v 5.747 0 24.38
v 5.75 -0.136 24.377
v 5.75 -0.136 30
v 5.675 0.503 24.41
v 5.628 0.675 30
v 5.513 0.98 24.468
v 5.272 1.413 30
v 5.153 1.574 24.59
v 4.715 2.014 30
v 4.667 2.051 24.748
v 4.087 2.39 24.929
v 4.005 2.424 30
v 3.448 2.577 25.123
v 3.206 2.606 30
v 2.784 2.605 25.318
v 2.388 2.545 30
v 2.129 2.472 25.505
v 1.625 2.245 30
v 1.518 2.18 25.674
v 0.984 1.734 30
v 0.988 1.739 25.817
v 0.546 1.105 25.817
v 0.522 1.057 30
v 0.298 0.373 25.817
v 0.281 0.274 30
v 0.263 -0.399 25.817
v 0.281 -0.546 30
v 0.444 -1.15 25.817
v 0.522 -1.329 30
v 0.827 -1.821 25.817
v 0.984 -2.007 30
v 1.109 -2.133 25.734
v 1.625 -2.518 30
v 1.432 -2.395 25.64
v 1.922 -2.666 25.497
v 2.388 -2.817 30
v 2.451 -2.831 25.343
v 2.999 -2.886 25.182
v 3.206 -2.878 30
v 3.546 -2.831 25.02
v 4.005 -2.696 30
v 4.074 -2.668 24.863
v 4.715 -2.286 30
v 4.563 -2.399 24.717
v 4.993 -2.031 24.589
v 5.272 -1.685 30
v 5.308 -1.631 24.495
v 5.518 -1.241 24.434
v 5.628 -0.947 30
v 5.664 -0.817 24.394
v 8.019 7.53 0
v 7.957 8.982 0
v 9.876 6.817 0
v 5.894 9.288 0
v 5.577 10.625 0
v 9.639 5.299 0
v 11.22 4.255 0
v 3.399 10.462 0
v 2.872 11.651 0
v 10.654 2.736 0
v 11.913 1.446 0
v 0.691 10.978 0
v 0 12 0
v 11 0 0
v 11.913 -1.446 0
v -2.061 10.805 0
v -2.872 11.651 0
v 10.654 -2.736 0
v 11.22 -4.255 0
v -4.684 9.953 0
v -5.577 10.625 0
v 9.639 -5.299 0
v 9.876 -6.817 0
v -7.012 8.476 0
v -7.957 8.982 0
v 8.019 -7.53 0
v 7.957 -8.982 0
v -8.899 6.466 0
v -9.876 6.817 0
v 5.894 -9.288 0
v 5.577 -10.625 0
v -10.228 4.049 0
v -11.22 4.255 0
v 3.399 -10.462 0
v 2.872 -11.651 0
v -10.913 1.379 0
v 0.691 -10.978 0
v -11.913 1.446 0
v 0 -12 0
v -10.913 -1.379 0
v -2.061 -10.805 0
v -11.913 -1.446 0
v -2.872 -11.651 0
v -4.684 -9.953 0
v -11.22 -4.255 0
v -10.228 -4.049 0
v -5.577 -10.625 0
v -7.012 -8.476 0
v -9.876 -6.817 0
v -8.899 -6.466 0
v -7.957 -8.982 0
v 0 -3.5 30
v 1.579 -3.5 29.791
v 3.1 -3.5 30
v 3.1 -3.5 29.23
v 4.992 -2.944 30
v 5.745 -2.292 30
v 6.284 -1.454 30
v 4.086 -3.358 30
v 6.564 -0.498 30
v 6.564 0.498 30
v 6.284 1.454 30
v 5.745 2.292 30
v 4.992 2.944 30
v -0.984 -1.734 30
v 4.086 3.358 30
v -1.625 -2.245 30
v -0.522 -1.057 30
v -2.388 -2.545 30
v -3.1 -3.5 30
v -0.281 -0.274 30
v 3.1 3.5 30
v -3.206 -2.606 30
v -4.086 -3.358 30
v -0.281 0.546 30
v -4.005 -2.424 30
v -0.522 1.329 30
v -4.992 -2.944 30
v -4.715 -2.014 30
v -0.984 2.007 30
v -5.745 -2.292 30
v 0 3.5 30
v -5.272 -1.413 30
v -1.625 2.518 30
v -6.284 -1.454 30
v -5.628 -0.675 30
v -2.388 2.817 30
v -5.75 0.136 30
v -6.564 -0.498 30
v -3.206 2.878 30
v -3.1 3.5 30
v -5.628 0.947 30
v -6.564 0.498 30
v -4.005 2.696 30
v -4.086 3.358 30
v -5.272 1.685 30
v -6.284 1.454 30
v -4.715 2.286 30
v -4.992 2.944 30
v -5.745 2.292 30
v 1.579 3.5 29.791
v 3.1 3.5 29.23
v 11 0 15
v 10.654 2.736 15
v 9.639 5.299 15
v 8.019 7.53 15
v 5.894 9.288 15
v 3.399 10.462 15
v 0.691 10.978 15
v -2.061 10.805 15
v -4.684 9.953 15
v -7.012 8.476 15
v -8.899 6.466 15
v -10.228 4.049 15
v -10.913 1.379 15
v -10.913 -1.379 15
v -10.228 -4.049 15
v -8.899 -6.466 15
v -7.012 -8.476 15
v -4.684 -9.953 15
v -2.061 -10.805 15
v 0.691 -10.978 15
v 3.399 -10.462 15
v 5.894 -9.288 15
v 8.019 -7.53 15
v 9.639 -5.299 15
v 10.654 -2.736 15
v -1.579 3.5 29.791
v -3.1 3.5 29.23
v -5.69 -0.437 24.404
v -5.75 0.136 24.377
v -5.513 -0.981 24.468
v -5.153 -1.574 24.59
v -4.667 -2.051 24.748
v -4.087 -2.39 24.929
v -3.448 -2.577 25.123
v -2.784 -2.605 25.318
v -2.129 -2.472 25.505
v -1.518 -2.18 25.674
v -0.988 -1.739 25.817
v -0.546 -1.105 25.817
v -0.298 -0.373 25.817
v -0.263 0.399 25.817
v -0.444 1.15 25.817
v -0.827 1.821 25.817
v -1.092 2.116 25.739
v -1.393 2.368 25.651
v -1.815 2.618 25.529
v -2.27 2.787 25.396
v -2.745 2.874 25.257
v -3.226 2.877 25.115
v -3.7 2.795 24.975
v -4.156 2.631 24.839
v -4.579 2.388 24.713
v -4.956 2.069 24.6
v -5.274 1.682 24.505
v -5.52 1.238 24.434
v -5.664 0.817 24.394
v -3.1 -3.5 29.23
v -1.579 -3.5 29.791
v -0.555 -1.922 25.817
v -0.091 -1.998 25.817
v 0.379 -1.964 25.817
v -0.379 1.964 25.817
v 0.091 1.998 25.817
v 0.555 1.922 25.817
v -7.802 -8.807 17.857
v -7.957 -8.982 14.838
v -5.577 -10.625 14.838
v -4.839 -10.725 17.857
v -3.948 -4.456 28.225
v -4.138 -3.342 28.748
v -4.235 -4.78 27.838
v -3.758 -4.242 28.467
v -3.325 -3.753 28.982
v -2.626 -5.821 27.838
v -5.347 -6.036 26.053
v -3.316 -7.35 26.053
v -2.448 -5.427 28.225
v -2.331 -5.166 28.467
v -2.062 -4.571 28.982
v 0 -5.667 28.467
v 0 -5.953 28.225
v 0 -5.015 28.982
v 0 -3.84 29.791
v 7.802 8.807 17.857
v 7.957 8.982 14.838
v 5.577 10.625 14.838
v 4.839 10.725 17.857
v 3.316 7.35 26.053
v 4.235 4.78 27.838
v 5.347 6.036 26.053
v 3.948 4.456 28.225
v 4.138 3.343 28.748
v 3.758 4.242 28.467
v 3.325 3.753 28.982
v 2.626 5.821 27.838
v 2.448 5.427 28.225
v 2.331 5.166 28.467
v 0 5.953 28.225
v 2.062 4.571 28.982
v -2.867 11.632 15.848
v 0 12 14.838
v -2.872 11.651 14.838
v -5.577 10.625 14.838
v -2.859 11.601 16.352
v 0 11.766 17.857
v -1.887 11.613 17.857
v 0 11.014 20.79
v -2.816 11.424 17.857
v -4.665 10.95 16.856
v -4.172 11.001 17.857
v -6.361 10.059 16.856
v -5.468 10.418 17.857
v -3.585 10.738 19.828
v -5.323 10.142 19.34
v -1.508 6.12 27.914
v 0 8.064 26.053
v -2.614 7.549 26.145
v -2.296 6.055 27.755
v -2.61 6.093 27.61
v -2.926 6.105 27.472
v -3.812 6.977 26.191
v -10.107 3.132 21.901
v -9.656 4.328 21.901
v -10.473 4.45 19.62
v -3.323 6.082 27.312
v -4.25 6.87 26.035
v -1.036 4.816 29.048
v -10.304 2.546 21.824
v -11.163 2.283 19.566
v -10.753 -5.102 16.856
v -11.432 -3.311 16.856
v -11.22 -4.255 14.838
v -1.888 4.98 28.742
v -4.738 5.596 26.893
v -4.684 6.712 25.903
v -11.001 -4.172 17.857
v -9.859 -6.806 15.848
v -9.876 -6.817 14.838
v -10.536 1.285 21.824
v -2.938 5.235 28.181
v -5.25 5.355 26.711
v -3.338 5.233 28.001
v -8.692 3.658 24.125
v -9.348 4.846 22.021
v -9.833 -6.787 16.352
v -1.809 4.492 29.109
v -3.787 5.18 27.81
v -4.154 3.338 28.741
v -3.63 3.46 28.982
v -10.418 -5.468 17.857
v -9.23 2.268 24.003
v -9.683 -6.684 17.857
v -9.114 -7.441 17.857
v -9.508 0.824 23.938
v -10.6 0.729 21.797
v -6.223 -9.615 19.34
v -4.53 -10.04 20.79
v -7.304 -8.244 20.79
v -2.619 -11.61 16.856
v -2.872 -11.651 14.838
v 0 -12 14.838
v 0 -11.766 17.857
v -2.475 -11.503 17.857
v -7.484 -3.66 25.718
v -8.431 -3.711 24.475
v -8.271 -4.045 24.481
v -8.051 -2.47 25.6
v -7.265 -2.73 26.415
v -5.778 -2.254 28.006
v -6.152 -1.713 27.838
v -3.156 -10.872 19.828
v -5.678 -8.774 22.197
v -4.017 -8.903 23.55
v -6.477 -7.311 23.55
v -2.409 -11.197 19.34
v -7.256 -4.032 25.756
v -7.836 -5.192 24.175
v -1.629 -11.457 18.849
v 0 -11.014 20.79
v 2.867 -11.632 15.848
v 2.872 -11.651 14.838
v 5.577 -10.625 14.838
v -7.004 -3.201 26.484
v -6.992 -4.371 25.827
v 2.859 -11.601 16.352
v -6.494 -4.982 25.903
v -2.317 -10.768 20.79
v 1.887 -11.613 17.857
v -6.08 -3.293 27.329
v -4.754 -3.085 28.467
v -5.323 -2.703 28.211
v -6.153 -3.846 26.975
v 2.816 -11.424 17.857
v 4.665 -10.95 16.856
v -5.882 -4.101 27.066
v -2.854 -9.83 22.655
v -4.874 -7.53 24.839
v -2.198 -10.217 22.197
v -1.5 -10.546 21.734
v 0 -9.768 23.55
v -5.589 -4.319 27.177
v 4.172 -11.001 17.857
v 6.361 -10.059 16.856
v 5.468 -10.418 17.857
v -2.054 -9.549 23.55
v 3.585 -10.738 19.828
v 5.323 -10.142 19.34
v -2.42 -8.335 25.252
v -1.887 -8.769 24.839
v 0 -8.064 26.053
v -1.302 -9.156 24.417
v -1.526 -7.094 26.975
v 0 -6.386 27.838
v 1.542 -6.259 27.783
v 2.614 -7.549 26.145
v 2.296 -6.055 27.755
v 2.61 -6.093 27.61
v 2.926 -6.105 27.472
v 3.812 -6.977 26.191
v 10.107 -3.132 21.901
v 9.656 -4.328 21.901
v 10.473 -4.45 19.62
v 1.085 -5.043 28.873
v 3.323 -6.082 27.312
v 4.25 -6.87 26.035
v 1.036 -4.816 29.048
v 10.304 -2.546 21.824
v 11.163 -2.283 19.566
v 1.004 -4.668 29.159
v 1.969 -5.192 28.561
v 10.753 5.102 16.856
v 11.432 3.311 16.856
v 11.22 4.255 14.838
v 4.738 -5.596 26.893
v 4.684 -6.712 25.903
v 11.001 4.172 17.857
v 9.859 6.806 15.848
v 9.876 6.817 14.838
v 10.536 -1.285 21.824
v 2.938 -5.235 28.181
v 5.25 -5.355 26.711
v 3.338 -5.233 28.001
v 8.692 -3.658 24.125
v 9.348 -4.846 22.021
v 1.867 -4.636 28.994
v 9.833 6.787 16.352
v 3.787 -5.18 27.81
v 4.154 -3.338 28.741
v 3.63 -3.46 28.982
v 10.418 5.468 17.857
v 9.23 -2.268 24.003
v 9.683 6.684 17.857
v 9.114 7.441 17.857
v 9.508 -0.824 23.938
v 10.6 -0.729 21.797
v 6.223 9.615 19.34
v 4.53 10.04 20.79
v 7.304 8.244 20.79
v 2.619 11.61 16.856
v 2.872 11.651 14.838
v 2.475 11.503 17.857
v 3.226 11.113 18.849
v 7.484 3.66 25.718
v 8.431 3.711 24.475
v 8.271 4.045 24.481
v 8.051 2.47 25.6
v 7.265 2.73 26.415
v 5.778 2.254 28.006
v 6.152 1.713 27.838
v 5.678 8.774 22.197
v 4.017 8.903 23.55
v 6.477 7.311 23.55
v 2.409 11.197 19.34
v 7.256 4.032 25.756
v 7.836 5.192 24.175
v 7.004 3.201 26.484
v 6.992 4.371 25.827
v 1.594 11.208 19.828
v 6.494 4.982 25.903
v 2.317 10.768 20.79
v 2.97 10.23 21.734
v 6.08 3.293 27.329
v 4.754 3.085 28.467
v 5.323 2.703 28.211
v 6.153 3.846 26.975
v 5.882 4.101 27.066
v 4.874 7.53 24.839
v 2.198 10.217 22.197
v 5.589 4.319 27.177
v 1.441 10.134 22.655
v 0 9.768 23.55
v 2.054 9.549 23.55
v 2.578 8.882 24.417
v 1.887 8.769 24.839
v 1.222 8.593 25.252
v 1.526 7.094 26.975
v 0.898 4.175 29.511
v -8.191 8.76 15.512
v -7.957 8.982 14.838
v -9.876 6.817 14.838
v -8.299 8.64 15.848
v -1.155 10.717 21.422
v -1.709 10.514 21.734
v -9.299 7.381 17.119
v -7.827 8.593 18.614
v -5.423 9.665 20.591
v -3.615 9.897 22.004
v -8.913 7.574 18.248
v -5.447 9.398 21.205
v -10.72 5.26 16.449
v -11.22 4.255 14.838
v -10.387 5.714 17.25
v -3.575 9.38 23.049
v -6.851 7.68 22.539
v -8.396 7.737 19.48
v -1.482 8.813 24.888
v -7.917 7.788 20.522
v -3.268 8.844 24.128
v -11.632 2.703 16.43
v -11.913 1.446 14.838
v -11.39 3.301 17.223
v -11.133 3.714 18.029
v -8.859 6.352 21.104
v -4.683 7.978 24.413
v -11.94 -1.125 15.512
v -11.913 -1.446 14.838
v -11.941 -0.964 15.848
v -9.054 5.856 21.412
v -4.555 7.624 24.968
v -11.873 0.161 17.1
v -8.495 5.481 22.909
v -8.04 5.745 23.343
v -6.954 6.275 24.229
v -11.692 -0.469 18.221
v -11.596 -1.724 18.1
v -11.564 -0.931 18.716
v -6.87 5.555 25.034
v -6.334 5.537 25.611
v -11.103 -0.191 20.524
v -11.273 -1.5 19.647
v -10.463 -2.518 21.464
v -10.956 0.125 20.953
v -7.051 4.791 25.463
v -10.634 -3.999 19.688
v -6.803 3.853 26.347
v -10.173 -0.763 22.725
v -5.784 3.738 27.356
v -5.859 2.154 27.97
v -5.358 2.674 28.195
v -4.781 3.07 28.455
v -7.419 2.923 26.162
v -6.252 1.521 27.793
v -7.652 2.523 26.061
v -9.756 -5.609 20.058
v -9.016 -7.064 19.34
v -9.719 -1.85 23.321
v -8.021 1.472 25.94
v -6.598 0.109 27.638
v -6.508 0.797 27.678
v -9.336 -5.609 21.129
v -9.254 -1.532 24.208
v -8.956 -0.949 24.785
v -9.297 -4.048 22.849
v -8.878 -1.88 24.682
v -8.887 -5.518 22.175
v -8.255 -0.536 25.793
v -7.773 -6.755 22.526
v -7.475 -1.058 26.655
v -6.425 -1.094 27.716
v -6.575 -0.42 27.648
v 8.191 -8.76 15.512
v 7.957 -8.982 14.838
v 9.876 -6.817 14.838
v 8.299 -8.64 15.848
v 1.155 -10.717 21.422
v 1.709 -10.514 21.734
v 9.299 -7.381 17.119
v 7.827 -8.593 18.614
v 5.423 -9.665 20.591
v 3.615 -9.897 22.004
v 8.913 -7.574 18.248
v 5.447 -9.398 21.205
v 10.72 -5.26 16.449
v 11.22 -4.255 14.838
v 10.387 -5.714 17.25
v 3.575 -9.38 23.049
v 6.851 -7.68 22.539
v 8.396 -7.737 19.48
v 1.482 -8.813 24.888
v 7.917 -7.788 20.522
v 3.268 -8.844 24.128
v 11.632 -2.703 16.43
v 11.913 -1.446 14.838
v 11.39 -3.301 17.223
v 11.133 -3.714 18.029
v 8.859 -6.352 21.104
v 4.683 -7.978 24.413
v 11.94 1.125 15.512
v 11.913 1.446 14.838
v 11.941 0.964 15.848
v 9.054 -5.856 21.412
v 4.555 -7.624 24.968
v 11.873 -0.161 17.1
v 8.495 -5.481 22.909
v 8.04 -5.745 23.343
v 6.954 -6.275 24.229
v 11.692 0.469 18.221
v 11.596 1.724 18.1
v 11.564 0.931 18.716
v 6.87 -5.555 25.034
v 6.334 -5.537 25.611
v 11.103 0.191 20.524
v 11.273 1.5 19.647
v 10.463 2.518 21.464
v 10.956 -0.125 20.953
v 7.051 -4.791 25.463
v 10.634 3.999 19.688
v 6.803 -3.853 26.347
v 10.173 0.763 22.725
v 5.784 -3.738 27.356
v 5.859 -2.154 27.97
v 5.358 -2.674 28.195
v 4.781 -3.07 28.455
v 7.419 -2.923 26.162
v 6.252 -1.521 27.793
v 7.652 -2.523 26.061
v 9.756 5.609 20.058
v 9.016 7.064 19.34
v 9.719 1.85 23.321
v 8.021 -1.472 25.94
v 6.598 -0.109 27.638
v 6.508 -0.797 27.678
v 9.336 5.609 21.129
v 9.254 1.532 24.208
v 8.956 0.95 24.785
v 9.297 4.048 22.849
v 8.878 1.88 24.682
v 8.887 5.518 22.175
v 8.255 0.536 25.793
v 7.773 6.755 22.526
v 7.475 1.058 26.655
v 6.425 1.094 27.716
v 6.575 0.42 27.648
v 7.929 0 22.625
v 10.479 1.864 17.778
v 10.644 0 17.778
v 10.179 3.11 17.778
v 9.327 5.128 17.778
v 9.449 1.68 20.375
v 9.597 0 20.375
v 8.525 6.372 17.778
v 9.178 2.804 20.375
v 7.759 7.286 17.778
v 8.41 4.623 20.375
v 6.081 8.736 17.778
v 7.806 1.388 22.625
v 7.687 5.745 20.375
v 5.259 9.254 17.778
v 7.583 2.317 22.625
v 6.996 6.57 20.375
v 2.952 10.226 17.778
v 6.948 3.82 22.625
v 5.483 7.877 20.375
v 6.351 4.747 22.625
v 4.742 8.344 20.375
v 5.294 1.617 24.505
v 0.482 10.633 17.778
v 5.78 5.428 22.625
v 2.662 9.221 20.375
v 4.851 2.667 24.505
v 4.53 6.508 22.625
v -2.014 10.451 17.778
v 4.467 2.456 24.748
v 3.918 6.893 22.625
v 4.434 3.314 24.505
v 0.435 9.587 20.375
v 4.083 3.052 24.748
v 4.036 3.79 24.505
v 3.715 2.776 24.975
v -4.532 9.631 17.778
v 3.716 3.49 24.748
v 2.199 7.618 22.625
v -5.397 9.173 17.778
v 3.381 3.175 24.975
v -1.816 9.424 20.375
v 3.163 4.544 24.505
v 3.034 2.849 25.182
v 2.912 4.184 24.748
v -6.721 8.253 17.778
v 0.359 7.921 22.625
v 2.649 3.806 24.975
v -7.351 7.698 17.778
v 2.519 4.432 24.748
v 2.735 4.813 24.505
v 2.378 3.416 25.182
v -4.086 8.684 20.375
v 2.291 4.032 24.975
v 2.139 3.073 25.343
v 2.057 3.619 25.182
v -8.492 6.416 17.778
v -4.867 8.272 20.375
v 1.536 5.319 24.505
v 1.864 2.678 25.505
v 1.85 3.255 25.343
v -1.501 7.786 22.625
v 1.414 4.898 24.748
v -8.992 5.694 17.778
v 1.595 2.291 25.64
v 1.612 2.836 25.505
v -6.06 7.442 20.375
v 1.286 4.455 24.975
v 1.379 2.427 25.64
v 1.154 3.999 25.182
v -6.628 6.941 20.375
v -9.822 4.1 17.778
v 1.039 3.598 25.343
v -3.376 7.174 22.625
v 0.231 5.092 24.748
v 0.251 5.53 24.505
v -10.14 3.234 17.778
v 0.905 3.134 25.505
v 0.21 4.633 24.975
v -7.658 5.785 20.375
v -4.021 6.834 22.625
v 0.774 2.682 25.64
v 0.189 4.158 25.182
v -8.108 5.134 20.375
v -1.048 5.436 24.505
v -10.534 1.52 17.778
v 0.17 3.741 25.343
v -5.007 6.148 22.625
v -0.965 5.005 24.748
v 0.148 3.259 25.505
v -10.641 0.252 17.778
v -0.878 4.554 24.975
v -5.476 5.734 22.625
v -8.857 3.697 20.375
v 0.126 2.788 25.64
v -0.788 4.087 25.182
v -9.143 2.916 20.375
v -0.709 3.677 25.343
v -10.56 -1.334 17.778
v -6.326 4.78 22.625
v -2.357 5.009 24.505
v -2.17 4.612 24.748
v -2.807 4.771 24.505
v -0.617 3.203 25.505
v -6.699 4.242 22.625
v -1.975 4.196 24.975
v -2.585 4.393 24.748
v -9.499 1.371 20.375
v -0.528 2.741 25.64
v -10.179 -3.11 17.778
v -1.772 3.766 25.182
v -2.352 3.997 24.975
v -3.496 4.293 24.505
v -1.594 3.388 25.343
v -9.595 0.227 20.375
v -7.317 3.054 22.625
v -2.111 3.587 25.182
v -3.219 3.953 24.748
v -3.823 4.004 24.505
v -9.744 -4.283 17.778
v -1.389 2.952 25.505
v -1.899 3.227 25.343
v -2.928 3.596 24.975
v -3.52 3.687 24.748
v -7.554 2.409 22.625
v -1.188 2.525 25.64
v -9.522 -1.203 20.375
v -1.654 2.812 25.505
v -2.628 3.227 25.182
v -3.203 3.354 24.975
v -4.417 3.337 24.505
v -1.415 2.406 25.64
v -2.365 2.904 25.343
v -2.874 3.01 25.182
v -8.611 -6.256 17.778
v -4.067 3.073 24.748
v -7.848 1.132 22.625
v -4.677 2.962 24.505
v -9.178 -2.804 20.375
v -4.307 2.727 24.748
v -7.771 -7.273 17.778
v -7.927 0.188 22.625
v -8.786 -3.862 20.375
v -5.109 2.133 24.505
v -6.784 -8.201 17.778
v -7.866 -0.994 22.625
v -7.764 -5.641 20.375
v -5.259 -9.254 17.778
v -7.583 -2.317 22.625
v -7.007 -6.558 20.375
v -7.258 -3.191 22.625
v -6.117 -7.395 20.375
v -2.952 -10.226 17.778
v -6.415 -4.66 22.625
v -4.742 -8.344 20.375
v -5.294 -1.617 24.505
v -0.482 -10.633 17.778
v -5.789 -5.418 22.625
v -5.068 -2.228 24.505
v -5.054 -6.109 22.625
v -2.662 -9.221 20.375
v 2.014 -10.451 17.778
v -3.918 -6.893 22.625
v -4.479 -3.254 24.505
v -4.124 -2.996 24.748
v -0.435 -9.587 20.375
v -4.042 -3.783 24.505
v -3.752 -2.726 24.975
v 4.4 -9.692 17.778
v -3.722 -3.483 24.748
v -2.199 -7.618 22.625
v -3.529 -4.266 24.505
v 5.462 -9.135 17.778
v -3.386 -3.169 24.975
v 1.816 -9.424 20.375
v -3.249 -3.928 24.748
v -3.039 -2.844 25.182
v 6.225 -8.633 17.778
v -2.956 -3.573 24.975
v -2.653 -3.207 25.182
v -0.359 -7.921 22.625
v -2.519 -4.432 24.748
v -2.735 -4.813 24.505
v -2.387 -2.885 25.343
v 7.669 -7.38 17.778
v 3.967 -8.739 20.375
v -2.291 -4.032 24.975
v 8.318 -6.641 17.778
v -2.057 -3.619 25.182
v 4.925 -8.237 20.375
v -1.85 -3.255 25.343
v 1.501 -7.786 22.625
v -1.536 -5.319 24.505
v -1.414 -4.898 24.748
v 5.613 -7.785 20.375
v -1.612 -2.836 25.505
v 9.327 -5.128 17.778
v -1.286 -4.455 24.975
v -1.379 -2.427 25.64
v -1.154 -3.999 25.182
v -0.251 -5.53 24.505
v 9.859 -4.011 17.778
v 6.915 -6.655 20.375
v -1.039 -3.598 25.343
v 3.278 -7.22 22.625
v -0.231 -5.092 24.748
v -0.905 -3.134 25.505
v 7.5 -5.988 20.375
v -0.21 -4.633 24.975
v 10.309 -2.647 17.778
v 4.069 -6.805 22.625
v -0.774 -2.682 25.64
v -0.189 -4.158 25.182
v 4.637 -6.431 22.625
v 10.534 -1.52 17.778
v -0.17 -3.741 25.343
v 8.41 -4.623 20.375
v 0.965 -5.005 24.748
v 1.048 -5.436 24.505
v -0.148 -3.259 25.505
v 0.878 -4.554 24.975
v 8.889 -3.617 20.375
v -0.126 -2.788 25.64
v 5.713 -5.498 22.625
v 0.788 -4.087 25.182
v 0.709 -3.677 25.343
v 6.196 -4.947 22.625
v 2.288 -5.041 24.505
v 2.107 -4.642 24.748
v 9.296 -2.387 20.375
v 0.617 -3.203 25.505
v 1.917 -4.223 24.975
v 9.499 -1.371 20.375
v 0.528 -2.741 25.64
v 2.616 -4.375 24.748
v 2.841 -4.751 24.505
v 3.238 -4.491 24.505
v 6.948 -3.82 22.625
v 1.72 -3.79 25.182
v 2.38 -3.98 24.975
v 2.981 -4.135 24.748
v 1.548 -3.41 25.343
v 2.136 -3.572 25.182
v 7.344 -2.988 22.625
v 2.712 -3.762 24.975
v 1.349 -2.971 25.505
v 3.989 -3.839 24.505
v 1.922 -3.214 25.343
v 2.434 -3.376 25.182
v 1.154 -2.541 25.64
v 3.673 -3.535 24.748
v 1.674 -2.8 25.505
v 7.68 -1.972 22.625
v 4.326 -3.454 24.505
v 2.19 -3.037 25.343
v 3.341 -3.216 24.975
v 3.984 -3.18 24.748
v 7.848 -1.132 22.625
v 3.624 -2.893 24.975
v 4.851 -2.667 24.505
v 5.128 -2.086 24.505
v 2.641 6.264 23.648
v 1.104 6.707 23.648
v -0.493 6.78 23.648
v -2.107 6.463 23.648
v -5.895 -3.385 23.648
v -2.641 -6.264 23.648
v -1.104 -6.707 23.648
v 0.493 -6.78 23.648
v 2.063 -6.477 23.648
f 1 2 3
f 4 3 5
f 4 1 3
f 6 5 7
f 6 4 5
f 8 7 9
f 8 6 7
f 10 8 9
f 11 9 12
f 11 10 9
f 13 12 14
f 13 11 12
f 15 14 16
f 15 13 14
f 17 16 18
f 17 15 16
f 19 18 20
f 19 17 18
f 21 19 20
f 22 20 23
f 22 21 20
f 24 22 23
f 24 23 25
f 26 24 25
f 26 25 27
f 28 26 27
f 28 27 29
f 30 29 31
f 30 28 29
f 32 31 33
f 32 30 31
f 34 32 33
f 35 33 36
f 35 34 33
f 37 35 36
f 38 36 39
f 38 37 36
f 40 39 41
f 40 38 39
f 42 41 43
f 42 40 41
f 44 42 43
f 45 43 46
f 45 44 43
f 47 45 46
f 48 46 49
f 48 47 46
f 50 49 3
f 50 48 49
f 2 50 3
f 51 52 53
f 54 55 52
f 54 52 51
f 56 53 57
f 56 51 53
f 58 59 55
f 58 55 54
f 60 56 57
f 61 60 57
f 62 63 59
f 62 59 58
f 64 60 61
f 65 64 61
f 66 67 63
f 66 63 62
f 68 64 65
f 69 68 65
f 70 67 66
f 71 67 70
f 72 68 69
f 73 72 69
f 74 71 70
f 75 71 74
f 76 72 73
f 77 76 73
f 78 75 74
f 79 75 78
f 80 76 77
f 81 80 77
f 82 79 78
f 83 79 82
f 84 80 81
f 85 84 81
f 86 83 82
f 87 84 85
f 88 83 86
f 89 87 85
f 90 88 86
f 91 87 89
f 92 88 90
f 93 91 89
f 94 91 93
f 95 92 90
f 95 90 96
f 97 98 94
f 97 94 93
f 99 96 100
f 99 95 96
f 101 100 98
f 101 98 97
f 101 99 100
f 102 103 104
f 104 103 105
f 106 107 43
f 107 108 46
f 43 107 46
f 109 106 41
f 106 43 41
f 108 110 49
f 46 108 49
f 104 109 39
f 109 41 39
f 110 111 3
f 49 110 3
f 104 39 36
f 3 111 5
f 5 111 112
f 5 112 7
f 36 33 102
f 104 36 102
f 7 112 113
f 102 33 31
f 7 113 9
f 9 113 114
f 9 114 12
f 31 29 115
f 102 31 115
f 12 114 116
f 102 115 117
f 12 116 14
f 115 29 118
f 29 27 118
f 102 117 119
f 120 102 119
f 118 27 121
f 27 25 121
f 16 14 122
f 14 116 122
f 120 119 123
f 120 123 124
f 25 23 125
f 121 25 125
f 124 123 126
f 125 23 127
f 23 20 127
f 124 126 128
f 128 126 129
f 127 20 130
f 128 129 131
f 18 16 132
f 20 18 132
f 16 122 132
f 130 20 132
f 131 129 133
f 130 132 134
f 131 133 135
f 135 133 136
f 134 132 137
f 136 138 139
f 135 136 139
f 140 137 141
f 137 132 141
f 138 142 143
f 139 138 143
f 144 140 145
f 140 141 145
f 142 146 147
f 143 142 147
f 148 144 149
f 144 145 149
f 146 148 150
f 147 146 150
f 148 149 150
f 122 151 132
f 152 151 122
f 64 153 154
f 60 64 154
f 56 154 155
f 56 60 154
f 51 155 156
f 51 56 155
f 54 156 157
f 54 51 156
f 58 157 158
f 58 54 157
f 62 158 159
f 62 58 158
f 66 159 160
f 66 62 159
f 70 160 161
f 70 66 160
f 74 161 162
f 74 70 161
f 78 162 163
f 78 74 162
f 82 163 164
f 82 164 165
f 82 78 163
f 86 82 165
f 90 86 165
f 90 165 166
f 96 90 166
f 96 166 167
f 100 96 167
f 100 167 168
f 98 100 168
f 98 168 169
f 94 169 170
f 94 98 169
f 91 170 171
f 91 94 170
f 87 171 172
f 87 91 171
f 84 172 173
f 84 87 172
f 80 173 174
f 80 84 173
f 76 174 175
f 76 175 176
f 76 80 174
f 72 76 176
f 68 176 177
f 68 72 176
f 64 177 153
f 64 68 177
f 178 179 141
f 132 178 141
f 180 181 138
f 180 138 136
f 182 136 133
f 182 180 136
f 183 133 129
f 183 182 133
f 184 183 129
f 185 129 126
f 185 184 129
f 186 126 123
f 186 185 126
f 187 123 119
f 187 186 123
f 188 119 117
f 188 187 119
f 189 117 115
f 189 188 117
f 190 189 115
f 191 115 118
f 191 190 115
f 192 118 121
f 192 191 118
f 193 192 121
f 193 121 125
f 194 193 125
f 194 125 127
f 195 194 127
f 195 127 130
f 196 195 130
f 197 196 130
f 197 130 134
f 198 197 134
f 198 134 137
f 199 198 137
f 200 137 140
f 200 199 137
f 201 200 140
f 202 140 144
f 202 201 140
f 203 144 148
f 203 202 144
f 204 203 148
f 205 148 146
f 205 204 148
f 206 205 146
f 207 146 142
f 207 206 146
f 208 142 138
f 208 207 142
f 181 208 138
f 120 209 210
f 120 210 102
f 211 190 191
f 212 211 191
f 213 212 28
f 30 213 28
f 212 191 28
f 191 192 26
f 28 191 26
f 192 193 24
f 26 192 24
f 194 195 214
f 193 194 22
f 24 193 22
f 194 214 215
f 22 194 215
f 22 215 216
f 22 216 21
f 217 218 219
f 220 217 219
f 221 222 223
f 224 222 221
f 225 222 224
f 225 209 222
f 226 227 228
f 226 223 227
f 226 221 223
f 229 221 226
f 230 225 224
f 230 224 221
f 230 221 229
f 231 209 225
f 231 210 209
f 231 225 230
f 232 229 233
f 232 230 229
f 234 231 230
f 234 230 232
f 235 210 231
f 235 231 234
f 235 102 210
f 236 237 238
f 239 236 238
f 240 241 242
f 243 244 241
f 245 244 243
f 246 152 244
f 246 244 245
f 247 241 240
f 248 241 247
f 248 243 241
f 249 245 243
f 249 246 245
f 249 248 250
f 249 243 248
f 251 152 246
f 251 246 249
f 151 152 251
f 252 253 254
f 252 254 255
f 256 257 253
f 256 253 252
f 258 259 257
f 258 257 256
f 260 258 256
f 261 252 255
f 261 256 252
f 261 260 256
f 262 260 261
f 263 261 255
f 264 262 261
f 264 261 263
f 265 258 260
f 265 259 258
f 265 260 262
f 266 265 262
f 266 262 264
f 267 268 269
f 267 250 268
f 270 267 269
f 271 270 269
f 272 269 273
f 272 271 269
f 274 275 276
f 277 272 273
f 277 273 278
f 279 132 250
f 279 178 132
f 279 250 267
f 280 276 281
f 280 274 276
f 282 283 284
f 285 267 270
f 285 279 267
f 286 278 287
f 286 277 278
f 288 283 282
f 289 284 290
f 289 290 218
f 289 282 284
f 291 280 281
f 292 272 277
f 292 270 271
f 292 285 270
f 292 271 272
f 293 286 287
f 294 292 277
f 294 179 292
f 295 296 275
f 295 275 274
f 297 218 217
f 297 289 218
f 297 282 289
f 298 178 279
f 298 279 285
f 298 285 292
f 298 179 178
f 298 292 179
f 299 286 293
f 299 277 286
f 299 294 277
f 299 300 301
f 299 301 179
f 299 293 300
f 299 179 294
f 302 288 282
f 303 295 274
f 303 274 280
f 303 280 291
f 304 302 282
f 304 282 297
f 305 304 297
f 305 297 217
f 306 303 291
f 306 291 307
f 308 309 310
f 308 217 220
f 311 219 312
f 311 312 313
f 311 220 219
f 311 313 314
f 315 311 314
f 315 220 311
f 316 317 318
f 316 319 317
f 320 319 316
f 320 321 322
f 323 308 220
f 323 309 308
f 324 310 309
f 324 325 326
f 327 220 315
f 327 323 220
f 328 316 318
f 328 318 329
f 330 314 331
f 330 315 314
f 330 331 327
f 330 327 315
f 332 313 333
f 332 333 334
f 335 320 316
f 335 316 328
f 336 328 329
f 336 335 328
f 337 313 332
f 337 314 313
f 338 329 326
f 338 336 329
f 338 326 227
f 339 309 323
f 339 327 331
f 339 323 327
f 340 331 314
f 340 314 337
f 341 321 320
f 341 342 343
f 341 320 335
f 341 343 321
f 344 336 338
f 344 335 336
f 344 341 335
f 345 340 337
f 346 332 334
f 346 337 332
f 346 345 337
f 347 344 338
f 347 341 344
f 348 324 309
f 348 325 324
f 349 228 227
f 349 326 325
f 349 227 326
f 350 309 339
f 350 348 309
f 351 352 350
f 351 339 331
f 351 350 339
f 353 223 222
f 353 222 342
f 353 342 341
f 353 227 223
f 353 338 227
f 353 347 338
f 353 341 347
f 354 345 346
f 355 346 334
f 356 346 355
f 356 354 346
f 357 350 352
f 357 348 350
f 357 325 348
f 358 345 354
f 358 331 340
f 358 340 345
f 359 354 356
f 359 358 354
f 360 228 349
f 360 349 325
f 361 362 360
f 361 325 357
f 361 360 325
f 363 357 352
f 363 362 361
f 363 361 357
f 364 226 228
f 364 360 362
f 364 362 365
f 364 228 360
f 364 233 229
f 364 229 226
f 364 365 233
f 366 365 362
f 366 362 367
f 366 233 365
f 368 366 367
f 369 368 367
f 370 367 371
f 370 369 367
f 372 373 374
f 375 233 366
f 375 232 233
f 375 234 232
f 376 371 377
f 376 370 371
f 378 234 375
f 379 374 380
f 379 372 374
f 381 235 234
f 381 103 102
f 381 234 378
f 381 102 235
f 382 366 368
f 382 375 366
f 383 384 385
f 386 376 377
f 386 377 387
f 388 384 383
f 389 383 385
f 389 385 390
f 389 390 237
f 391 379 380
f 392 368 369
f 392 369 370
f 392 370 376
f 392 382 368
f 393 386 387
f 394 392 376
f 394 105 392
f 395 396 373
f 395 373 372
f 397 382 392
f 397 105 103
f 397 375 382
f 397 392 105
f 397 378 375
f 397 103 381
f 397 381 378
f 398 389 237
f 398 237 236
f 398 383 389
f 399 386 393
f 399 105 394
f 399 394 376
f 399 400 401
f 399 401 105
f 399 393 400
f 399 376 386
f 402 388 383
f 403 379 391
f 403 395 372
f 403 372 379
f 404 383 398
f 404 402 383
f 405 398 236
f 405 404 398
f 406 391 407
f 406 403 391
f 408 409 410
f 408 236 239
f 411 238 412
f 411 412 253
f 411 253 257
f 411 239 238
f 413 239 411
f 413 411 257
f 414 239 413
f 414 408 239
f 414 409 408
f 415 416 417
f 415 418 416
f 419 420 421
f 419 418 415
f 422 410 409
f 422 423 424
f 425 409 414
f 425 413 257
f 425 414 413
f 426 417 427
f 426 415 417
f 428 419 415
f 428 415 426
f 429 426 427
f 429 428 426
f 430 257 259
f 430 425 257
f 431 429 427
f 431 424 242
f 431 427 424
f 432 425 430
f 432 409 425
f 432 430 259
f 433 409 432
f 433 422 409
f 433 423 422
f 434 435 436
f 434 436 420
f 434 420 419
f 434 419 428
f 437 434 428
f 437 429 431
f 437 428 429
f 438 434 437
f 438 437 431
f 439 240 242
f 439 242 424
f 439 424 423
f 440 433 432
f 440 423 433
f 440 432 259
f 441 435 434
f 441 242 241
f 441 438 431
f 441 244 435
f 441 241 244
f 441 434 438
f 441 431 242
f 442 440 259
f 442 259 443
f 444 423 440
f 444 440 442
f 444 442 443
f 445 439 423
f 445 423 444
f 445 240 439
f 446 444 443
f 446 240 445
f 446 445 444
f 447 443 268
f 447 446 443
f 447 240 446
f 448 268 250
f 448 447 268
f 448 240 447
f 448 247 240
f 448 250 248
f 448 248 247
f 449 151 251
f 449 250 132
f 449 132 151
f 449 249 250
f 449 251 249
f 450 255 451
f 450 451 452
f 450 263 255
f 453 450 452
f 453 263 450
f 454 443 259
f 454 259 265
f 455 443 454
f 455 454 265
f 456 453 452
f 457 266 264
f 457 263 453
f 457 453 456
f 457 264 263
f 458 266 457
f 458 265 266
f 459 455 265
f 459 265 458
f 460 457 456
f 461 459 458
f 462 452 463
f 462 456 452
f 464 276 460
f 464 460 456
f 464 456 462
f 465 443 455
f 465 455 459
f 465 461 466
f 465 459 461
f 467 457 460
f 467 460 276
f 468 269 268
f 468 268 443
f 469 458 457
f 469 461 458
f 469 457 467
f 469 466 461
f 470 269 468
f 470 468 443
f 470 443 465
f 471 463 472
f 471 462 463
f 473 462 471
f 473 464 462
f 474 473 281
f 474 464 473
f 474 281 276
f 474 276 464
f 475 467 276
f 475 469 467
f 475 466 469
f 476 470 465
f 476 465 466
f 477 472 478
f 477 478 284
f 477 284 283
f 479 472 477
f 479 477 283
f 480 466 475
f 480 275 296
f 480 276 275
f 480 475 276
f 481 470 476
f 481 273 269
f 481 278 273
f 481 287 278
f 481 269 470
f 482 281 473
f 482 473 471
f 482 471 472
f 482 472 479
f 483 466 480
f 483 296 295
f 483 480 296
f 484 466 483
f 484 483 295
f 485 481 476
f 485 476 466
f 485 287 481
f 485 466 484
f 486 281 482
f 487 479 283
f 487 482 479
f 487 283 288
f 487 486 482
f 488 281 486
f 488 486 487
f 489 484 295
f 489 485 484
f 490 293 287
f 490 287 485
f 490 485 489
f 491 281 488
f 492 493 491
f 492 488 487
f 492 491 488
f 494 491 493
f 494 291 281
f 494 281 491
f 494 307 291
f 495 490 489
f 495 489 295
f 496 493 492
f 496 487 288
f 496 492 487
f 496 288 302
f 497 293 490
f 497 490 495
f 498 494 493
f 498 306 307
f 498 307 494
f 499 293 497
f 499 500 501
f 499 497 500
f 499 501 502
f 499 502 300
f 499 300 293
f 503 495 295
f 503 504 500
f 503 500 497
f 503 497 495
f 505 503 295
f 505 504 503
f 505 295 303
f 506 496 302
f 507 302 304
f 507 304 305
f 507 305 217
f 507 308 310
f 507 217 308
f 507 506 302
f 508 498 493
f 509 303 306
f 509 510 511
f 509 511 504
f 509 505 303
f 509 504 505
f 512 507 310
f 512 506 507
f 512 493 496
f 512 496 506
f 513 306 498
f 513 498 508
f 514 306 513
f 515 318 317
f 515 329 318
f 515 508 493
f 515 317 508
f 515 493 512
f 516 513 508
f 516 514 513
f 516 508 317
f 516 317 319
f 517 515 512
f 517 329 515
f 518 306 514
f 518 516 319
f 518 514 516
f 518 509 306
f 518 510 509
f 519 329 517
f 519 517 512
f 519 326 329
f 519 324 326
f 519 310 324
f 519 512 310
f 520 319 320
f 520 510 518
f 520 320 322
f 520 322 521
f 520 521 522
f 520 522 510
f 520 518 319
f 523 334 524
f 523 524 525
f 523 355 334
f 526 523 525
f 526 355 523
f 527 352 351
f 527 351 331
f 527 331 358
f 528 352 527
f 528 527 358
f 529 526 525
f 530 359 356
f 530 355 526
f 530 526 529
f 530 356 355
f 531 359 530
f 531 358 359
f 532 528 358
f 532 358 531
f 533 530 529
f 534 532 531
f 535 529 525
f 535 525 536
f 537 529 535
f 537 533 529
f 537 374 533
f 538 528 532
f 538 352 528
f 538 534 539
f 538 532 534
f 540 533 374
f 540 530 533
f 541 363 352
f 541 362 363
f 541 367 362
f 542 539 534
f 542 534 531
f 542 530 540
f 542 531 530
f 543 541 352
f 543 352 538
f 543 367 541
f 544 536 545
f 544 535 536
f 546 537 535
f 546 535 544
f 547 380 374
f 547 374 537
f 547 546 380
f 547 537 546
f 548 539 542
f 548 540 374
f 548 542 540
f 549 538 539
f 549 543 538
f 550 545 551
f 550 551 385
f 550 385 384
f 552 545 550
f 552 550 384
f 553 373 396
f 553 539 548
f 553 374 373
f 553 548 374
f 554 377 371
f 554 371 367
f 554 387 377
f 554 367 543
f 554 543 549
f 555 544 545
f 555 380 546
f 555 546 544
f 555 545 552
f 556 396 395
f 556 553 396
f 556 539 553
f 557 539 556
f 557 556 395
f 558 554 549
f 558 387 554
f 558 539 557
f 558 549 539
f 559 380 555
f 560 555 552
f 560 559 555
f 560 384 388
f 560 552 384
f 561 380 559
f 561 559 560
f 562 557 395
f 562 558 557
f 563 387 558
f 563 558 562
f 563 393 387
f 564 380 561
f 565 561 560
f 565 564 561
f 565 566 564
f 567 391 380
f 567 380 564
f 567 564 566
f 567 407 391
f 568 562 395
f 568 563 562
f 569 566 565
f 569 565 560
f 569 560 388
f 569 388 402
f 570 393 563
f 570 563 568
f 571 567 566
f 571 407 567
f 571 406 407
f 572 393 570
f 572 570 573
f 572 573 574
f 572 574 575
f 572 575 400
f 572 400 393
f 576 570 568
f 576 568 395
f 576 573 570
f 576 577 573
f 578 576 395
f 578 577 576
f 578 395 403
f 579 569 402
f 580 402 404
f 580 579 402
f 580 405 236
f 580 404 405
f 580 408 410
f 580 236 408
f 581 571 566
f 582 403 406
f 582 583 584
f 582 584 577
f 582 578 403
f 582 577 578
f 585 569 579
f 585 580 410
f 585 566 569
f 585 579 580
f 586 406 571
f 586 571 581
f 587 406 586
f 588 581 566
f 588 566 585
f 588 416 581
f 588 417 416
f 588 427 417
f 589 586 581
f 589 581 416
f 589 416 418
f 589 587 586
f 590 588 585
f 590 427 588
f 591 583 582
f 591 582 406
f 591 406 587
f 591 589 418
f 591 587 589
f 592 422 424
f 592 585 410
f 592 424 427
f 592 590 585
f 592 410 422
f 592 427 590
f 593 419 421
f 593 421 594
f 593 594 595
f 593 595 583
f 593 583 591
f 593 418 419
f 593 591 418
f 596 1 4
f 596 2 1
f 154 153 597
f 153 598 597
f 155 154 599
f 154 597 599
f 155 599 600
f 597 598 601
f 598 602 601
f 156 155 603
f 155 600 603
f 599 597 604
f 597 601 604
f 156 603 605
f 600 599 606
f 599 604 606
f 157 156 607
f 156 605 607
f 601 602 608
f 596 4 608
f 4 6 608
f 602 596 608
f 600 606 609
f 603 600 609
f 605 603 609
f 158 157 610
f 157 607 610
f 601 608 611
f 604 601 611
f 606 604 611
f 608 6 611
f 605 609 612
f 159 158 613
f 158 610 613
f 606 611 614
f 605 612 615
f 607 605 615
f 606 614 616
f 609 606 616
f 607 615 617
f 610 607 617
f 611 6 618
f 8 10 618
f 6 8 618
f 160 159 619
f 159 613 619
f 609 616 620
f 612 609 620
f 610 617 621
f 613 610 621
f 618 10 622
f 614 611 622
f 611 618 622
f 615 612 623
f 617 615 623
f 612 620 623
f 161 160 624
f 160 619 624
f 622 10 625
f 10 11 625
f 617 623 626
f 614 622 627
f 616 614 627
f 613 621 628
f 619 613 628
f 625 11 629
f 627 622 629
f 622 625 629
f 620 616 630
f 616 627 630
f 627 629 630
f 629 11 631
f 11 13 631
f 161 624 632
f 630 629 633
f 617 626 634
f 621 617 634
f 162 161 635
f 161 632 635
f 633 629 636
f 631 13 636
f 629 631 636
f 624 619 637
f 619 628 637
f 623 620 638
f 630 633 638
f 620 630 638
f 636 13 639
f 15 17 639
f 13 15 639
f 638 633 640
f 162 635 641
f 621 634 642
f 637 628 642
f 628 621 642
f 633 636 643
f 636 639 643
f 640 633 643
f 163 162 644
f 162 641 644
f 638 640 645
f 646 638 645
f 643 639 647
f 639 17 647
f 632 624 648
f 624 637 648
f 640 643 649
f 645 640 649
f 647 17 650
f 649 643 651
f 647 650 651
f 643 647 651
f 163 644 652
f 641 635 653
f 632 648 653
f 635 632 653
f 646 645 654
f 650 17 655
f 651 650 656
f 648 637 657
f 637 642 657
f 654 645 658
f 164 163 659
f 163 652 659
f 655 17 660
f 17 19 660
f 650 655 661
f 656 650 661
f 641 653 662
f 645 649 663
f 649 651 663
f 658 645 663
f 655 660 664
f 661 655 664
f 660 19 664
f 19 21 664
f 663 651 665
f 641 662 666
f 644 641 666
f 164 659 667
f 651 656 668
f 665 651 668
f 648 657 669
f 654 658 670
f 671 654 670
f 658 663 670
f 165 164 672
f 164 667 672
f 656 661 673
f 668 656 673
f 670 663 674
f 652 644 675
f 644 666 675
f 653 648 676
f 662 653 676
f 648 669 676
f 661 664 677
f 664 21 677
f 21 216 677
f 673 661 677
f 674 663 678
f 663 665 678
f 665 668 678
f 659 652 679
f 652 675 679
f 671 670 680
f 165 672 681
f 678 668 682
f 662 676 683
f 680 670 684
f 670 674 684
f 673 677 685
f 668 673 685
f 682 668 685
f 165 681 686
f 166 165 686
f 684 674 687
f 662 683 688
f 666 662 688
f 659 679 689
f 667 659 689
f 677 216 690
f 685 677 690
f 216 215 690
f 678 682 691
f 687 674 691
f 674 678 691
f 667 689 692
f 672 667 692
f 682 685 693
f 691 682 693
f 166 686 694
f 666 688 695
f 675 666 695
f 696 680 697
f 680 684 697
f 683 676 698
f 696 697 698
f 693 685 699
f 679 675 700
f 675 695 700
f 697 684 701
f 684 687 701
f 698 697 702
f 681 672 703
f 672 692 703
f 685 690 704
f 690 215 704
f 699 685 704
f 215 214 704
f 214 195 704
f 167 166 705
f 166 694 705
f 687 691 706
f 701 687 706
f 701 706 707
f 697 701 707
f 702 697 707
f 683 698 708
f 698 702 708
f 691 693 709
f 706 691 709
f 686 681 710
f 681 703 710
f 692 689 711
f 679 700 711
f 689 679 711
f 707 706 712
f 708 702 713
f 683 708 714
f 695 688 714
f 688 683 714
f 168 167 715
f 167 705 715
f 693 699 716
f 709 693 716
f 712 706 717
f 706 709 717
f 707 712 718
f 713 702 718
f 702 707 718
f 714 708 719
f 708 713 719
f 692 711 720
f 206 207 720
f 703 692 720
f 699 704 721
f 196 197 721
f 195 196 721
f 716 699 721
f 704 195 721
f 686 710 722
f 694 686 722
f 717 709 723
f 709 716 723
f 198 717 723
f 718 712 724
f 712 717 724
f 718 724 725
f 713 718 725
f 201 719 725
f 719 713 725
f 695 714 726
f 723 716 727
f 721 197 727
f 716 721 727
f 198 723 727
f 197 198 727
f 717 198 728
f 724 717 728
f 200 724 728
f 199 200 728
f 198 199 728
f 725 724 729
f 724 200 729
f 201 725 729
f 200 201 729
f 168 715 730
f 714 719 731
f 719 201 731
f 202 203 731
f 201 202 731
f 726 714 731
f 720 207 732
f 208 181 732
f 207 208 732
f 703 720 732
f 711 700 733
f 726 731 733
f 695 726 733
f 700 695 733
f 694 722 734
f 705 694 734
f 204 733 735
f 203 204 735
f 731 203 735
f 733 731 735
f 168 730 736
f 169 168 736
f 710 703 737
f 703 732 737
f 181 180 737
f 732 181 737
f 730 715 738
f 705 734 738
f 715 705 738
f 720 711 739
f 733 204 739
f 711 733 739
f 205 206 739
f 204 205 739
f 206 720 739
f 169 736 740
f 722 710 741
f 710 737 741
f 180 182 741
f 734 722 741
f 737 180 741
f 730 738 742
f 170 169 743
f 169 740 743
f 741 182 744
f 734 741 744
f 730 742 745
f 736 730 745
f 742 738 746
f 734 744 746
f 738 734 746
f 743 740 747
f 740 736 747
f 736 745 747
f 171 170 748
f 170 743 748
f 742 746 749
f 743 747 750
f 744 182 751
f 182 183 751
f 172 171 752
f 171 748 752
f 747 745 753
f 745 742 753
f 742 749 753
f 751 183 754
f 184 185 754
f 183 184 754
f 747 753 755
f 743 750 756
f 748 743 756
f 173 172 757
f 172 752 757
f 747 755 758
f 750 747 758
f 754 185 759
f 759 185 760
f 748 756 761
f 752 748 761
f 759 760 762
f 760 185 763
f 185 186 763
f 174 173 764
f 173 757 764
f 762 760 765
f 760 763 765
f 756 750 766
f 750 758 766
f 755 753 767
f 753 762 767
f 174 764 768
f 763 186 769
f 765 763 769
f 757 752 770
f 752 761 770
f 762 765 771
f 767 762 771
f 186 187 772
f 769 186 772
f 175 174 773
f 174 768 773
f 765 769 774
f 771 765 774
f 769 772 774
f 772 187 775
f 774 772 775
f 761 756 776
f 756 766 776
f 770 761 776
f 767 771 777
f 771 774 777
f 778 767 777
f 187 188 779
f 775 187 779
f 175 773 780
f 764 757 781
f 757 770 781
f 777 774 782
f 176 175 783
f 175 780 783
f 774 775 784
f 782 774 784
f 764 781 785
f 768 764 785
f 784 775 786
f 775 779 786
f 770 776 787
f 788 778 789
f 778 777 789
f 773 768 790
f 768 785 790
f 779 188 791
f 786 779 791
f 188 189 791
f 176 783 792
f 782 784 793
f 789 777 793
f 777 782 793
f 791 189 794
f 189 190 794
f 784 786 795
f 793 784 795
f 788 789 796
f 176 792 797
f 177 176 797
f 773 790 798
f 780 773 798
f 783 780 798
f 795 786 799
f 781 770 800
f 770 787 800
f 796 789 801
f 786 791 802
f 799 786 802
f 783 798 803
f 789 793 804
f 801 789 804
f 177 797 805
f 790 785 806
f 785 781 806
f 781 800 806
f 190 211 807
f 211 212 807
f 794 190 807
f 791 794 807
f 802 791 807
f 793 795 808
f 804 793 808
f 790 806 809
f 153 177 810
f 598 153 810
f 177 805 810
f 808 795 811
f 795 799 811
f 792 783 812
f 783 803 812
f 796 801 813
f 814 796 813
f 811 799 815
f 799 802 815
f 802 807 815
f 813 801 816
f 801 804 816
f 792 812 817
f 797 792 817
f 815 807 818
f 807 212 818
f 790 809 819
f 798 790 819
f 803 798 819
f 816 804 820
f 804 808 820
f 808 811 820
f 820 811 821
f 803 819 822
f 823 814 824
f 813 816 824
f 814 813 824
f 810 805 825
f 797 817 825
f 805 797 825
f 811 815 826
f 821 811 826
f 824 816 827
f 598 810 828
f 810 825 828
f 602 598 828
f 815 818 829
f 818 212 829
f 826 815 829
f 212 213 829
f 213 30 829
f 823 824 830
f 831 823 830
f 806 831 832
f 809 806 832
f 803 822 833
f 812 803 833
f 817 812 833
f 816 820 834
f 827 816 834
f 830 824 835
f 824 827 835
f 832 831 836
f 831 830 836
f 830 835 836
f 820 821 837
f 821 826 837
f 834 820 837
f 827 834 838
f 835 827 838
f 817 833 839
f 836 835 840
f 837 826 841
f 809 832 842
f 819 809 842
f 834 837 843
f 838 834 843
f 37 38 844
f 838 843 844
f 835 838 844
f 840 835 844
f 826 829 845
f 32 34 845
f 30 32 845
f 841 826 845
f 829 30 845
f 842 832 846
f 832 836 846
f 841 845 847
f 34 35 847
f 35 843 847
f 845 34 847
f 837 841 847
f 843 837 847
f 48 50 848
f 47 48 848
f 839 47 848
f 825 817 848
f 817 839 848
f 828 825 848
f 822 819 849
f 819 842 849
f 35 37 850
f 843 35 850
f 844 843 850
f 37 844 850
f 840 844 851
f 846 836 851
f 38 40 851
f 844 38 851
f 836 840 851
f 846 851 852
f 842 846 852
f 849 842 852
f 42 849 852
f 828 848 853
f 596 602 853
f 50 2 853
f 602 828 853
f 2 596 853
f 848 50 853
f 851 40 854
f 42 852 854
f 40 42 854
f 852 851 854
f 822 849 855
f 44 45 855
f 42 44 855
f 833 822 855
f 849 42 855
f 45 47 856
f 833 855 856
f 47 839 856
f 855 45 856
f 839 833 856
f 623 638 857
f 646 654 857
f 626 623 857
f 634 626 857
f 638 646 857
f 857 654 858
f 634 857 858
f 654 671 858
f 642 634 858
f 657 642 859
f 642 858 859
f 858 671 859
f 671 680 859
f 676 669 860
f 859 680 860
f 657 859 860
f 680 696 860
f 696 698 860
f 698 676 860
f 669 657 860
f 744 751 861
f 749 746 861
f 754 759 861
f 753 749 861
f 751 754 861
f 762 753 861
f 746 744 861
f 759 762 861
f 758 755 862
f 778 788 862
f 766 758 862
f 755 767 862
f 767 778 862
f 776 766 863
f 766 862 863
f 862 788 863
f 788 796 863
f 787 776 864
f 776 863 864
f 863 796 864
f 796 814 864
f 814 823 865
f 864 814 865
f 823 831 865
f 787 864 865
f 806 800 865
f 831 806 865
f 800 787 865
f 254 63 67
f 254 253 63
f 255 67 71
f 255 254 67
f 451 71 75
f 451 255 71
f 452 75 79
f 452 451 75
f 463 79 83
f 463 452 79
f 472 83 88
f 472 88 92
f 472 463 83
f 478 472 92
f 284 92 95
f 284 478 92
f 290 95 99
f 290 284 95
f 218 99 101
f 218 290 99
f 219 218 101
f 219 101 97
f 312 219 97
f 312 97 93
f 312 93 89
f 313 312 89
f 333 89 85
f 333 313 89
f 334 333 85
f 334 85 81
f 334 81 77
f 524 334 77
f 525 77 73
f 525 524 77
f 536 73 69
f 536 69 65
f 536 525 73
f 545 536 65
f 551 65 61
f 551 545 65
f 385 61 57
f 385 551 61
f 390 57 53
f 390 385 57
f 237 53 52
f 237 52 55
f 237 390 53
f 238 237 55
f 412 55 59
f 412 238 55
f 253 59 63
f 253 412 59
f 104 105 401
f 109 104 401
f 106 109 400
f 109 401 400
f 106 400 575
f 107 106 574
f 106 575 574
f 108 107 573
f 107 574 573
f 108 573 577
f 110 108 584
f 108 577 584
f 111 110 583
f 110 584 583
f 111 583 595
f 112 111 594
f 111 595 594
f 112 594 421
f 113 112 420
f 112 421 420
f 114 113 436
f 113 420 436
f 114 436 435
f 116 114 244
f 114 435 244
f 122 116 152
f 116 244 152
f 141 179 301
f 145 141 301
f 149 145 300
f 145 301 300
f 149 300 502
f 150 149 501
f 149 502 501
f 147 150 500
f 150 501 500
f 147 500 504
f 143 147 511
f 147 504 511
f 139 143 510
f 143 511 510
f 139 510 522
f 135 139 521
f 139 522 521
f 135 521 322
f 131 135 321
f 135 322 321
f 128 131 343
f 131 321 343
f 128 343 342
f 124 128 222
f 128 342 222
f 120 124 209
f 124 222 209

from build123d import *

# Parameters (mm, degrees)
SKETCH002_R  = 2.75
PAD001_DEPTH = 30
ARRAY_COUNT  = 2
SKETCH_R     = 11
PAD_DEPTH    = 15
PAD002_DEPTH = 30


with BuildPart() as array:
    # Sketch002 → Pad001 (new body)
    with BuildSketch(Plane.XY):
        with Locations((3, -0.136076)):
            Circle(SKETCH002_R)
    extrude(amount=PAD001_DEPTH)

    # Array: Array ×2 about axis
    array_axis = Axis((0, 0, 0), (0, 0, 1))


with BuildPart() as array_1:
    add(array.part)
    for i in range(1, ARRAY_COUNT):
        add(array.part.rotate(array_axis, i * 360 / ARRAY_COUNT))


with BuildPart() as body001:
    # Sketch001 → Revolution (revolve)
    with BuildSketch(Plane.XZ):
        with BuildLine():
            Line((0, 15), (11, 15))
            ThreePointArc((11, 15), (8.455767, 22.035624), (2, 25.816654))
            Line((2, 25.816654), (0, 25.816654))
            Line((0, 25.816654), (0, 15))
        make_face()
    revolve(axis=Axis((0, 0, 0), (0, 0, 1)))


with BuildPart() as fusion001:
    # Sketch → Pad (new body)
    with BuildSketch(Plane.XY):
        Circle(SKETCH_R)
    extrude(amount=PAD_DEPTH)

    # Fusion001: union Body001
    add(body001.part)


with BuildPart() as body003:
    # Sketch003 → Revolution001 (revolve)
    with BuildSketch(Plane.YZ):
        with BuildLine():
            Line((0, 0), (12, 0))
            Line((12, 0), (12, 14.837809))
            ThreePointArc((12, 14.837809), (9.767649, 23.550009), (3.5, 30))
            Line((0, 30), (3.5, 30))
            Line((0, 30), (0, 0))
        make_face()
    revolve(axis=Axis((0, 0, 0), (0, 0, 1)))


with BuildPart() as cut001:
    # Sketch004 → Pad002 (new body)
    with BuildSketch(Plane.XY):
        with BuildLine():
            Line((-3.1, 3.5), (3.1, 3.5))
            ThreePointArc((3.100018, -3.5), (6.6, 9e-06), (3.1, 3.5))
            Line((-3.100018, -3.5), (3.100018, -3.5))
            ThreePointArc((-3.1, 3.5), (-6.6, 9e-06), (-3.100018, -3.5))
        make_face()
    extrude(amount=PAD002_DEPTH)

    # Fusion: union Body003
    add(body003.part)

    # Cut: cut Fusion001
    add(fusion001.part, mode=Mode.SUBTRACT)

    # Cut001: cut Array
    add(array_1.part, mode=Mode.SUBTRACT)


solid = cut001.part
